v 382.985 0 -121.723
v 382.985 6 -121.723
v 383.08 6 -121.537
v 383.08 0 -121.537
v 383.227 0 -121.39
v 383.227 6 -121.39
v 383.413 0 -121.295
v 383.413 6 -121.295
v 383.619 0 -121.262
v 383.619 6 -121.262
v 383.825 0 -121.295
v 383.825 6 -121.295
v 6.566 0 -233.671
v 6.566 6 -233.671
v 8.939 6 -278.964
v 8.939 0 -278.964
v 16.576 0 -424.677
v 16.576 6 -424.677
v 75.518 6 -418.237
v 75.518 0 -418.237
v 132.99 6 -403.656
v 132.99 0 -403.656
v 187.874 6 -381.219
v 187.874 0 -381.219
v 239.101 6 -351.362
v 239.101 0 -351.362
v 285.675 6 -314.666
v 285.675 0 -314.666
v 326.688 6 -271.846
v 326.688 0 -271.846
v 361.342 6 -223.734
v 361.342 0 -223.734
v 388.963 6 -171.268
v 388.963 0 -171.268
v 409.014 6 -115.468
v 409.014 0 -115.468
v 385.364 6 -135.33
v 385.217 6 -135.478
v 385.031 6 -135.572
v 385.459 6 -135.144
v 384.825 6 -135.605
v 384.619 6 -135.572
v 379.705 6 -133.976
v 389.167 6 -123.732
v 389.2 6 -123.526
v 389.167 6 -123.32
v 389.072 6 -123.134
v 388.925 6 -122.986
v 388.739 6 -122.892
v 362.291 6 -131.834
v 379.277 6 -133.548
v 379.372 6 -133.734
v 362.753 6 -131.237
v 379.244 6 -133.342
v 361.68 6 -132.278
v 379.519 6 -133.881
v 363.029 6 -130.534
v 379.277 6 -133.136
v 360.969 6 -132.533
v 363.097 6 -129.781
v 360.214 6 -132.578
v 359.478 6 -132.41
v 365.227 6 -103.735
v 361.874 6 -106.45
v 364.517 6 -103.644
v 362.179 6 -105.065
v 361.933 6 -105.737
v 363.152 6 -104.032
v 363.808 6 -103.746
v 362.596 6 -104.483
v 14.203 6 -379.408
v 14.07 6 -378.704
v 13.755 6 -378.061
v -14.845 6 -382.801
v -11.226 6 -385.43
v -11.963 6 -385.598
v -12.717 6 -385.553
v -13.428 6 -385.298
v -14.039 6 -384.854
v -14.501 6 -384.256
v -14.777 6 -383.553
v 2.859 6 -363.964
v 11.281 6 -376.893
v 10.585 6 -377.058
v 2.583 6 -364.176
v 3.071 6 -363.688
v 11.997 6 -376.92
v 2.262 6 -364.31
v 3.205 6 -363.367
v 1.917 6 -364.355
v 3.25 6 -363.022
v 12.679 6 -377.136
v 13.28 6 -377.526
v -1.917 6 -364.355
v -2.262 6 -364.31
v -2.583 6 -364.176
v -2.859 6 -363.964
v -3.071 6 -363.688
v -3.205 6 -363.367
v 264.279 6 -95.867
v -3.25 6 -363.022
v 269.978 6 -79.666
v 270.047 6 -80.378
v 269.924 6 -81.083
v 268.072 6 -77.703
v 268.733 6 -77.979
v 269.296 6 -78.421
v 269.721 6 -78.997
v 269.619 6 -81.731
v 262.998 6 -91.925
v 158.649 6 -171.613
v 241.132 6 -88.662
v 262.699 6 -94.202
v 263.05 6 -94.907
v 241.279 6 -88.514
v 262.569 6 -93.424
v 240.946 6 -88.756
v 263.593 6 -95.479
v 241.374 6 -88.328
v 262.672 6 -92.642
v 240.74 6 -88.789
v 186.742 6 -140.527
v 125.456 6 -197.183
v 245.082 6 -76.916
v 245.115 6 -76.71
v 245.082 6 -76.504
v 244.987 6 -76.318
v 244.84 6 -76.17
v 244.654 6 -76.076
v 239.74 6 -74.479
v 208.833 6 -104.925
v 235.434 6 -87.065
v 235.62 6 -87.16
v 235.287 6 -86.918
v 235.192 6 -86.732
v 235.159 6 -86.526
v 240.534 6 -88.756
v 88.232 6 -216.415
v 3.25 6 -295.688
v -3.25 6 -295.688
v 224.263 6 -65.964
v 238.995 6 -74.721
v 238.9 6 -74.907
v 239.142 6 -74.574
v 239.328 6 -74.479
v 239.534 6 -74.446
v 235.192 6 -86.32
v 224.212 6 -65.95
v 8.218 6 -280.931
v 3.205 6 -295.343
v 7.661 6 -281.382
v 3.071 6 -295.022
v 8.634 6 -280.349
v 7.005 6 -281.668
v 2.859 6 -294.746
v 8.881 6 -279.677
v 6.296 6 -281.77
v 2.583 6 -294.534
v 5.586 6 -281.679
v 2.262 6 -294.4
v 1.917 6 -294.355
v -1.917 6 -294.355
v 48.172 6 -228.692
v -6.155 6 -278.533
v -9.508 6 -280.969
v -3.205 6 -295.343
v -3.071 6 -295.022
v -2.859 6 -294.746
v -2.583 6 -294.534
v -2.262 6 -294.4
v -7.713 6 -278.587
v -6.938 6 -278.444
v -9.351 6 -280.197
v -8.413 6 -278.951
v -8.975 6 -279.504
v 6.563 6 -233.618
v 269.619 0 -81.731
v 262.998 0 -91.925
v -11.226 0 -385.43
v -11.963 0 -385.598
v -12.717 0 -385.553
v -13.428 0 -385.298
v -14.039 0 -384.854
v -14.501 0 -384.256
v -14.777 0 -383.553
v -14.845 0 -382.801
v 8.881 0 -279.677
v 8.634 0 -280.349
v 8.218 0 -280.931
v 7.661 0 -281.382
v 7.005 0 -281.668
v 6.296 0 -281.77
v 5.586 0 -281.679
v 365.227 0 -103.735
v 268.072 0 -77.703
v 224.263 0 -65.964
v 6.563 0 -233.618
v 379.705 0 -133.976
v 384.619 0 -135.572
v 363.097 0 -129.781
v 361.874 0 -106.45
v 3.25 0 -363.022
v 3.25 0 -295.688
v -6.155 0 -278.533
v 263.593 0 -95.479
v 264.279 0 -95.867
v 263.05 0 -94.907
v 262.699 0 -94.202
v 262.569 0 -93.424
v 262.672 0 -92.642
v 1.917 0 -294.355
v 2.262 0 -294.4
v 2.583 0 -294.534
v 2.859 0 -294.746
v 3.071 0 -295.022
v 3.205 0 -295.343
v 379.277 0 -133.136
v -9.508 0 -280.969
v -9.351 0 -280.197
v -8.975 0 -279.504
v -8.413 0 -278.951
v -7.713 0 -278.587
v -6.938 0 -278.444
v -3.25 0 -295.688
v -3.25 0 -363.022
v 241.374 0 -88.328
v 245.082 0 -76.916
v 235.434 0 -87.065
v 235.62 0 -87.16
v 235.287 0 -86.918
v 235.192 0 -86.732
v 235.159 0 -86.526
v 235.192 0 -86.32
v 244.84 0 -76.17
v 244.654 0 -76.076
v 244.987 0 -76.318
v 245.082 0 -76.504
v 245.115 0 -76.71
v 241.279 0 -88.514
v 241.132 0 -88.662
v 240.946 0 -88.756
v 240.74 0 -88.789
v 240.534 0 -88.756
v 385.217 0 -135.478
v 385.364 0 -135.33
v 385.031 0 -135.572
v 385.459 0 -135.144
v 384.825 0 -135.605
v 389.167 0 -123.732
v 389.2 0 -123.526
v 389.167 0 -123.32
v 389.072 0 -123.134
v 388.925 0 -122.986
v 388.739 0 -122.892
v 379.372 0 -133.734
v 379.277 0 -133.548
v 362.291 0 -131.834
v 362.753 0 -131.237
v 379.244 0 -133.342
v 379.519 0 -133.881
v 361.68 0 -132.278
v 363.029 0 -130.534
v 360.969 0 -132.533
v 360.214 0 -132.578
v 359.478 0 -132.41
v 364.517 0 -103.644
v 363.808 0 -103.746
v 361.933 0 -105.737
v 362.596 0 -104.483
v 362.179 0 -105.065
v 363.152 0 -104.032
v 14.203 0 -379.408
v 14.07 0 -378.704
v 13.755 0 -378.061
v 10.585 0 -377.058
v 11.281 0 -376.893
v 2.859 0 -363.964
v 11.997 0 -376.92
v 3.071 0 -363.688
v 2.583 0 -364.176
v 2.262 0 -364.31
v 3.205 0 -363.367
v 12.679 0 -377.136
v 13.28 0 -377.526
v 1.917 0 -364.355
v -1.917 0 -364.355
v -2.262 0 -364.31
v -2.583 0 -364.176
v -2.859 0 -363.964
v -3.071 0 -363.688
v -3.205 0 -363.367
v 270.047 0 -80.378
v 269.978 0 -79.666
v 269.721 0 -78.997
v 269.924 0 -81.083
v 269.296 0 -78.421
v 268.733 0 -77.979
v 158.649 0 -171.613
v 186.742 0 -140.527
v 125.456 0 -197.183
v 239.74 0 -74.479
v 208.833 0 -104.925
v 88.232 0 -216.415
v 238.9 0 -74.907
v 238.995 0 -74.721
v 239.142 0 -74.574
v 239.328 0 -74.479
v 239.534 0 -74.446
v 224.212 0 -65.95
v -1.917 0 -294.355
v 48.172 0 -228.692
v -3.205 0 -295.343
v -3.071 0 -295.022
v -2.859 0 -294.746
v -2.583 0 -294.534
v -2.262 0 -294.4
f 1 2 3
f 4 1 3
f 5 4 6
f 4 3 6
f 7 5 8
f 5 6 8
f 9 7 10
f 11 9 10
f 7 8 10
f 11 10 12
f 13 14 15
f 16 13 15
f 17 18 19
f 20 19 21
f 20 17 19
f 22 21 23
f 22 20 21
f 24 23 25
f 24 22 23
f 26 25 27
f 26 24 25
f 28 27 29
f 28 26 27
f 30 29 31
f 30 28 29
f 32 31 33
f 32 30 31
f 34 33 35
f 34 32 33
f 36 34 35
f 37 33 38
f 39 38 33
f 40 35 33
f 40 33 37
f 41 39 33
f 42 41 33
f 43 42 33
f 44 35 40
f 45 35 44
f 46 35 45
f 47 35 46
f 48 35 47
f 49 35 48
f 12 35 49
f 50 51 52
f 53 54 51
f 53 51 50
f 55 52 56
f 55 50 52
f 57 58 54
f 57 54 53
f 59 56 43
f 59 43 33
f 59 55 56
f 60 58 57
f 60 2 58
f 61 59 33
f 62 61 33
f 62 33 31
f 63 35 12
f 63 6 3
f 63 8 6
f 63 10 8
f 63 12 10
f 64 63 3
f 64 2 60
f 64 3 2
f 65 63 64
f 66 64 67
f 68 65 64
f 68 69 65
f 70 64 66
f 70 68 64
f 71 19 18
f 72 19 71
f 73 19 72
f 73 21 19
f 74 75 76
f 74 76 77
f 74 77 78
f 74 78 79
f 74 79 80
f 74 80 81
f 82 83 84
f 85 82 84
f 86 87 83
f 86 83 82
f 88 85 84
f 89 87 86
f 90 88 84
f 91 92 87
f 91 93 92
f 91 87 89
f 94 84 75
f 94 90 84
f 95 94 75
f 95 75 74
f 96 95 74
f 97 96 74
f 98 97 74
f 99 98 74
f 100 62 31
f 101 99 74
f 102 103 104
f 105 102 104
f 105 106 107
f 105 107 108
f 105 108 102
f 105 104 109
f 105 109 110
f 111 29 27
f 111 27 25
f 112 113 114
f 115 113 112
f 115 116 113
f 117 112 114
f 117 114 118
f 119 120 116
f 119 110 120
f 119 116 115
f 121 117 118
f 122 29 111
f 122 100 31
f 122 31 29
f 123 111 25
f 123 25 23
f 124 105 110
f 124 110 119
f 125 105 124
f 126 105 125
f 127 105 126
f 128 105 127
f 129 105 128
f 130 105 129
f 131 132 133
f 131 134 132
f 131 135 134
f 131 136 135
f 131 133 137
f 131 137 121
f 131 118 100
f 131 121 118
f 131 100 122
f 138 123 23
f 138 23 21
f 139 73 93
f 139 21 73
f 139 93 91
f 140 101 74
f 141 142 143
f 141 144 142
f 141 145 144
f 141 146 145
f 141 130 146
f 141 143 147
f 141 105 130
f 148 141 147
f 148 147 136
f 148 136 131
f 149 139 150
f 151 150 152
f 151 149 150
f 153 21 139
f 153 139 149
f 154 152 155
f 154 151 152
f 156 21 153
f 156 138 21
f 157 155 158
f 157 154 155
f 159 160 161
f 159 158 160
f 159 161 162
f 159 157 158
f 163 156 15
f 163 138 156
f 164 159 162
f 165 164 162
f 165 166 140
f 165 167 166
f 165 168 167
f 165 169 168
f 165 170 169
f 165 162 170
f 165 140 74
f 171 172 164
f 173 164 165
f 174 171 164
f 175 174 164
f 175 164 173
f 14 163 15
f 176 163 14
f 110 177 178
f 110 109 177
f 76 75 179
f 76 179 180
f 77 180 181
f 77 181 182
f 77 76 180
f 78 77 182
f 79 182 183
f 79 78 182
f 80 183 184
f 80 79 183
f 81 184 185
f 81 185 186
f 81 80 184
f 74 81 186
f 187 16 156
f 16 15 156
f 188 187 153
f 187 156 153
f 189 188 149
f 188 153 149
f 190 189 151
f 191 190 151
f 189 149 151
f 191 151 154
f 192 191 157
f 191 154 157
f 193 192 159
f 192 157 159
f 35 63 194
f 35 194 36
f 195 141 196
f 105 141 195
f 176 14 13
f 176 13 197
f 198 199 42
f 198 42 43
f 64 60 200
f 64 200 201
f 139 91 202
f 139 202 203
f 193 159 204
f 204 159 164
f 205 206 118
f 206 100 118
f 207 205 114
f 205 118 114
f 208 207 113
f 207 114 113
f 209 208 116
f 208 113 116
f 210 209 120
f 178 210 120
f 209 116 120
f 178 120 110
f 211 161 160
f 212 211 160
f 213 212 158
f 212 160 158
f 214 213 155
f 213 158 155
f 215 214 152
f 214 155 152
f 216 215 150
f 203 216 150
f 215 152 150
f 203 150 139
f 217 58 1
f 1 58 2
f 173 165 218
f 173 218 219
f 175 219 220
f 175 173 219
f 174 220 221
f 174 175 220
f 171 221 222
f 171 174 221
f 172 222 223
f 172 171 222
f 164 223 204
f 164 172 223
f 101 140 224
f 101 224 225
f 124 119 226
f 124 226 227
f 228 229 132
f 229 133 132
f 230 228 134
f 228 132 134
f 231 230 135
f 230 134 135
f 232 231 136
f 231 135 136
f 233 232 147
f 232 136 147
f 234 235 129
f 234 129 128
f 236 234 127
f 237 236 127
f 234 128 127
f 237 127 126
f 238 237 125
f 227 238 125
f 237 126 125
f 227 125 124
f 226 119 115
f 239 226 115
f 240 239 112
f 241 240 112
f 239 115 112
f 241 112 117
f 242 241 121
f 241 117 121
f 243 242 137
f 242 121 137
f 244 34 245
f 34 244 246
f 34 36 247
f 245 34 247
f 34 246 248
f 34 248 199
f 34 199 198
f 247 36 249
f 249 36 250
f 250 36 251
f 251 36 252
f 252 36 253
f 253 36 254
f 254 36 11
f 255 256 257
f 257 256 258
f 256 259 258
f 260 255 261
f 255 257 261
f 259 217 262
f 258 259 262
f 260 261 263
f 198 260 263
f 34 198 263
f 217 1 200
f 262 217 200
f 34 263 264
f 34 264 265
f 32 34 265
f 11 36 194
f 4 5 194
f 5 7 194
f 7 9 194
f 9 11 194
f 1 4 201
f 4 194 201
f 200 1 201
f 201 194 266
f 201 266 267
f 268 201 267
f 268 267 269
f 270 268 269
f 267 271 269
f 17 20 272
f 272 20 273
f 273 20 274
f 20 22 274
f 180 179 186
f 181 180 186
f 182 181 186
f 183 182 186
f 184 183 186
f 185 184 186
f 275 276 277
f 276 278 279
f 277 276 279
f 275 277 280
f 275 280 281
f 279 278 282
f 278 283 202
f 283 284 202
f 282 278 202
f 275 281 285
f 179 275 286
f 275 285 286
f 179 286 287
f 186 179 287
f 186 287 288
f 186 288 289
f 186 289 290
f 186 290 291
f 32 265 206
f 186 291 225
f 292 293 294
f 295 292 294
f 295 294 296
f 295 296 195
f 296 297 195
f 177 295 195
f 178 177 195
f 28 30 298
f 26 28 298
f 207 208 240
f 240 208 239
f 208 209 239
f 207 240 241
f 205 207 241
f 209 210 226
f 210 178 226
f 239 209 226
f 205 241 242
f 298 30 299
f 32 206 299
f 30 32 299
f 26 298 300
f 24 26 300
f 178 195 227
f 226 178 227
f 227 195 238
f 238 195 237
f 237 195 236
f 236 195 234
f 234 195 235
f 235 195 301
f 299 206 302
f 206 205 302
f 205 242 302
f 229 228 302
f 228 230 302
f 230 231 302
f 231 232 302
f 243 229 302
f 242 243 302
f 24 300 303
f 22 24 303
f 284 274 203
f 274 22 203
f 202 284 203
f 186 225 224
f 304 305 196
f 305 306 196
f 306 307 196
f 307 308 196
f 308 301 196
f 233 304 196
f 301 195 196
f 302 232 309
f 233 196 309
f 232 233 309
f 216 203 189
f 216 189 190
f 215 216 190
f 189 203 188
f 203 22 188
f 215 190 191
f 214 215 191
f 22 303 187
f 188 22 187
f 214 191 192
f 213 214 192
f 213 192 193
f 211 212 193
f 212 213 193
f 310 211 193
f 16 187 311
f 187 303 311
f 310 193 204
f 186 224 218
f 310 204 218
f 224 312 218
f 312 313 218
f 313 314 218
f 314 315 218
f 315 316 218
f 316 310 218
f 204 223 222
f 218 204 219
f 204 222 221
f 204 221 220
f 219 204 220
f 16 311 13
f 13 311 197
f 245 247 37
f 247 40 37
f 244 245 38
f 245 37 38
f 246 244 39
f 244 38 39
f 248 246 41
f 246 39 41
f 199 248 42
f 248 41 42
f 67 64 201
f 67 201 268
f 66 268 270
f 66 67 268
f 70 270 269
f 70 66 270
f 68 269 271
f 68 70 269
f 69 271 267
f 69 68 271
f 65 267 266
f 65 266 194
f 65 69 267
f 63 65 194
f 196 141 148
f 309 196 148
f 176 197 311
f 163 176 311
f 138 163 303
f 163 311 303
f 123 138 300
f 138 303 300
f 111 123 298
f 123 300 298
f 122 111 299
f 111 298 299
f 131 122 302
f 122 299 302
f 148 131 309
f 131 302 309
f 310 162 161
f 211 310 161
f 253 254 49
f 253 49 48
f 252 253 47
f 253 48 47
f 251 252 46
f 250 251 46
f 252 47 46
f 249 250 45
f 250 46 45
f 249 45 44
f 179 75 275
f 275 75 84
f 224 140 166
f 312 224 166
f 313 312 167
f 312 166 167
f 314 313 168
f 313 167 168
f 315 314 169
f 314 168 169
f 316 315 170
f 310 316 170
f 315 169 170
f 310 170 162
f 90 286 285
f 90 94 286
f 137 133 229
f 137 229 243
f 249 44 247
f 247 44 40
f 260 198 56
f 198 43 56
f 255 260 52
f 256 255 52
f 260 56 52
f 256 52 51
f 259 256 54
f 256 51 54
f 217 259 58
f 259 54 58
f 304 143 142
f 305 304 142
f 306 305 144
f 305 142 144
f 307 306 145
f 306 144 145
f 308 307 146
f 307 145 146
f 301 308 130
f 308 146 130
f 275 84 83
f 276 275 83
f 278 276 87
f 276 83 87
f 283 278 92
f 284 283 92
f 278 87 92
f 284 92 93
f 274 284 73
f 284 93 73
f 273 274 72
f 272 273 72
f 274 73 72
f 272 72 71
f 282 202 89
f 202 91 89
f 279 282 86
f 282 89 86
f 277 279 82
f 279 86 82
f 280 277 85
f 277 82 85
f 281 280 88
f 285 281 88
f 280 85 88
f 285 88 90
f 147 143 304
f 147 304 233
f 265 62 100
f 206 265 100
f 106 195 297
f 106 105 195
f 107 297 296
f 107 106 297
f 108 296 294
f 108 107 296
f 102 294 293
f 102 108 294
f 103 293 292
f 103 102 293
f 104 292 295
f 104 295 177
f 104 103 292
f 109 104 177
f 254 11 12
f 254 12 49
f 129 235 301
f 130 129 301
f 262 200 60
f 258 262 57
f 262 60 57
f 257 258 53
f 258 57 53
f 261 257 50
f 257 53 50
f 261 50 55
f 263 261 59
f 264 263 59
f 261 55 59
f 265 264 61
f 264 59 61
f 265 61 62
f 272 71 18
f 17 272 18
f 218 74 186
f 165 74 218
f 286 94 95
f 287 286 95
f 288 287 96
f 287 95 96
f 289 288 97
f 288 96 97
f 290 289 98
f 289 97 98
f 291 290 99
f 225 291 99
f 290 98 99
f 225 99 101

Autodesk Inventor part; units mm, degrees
ref_plane "YZ Plane" through (0, 0, 0) normal (1, 0, 0) x (0, 1, 0)
ref_plane "XZ Plane" through (0, 0, 0) normal (0, 1, 0) x (-1, 0, 0)
ref_plane "XY Plane" through (0, 0, 0) normal (0, 0, 1) x (1, 0, 0)
sketch "Sketch1" plane through (0, 0, 0) normal (0, 1, 0) x (-1, 0, 0)
  circle A0 centre (0, 0) radius 425
  circle A1 centre (0, 0) radius 233.71
  dimension "d84" = 467.42
  dimension "d85" = 850
extrude "Extrusion3" add sketch "Sketch1" along normal blind 6
sketch "Sketch2" plane through (0, 6, 0) normal (0, 1, 0) x (1, 0, 0)
  circle A0 centre (0, 0) radius 329.355 construction
  line L0 (3.25, 363.0217) -> (3.25, 295.6883)
  line L1 (-3.25, 295.6883) -> (-3.25, 363.0217)
  arc A1 (-3.25, 295.6883) -> (-1.9167, 294.355) centre (-1.9167, 295.6883) ccw
  arc A2 (1.9167, 294.355) -> (3.25, 295.6883) centre (1.9167, 295.6883) ccw
  arc A3 (-1.9167, 364.355) -> (-3.25, 363.0217) centre (-1.9167, 363.0217) ccw
  arc A4 (3.25, 363.0217) -> (1.9167, 364.355) centre (1.9167, 363.0217) ccw
  line L2 (-1.9167, 364.355) -> (1.9167, 364.355)
  line L3 (-1.9167, 294.355) -> (1.9167, 294.355)
  line L4 (0, 294.355) -> (0, 329.355) construction
  line L5 (0, 364.355) -> (0, 329.355) construction
  line L6 (0, 364.355) -> (0, 294.355) construction
  line L7 (175.0629, -238.5433) -> (171.9617, -240.7965)
  arc A5 (176.9253, -238.8383) -> (175.0629, -238.5433) centre (175.8467, -239.622) ccw
  arc A6 (171.9617, -240.7965) -> (171.6667, -242.6589) centre (172.7454, -241.8752) ccw
  line L8 (173.0175, -238.1382) -> (193.59, -266.4538) construction
  line L9 (211.2443, -297.1327) -> (171.6667, -242.6589)
  line L10 (176.9253, -238.8383) -> (216.5029, -293.3121)
  line L11 (214.1625, -294.7694) -> (173.0175, -238.1382) construction
  line L12 (214.1625, -294.7694) -> (193.59, -266.4538) construction
  arc A7 (211.2443, -297.1327) -> (213.1067, -297.4277) centre (212.323, -296.349) ccw
  line L13 (216.2079, -295.1745) -> (213.1067, -297.4277)
  arc A8 (216.2079, -295.1745) -> (216.5029, -293.3121) centre (215.4242, -294.0958) ccw
  line L14 (280.1548, 92.2019) -> (281.3393, 88.5562)
  arc A9 (281.0108, 93.882) -> (280.1548, 92.2019) centre (281.4229, 92.614) ccw
  arc A10 (281.3393, 88.5562) -> (283.0194, 87.7002) centre (282.6074, 88.9682) ccw
  line L15 (279.9482, 90.9607) -> (313.2352, 101.7763) construction
  line L16 (347.0573, 108.5073) -> (283.0194, 87.7002)
  line L17 (281.0108, 93.882) -> (345.0486, 114.6892)
  line L18 (346.5222, 112.5919) -> (279.9482, 90.9607) construction
  line L19 (346.5222, 112.5919) -> (313.2352, 101.7763) construction
  arc A11 (347.0573, 108.5073) -> (347.9133, 110.1874) centre (346.6452, 109.7754) ccw
  line L20 (346.7287, 113.8331) -> (347.9133, 110.1874)
  arc A12 (346.7287, 113.8331) -> (345.0486, 114.6892) centre (345.4607, 113.4211) ccw
  dimension "d86" = 658.71
  dimension "d21" = 6.5
  dimension "d24" = 2.6667
  dimension "d25" = 2.6667
  dimension "d32" = 1.3333
  dimension "d33" = 1.3333
  dimension "d162" = 70
  dimension "d163" = 294.355
  dimension "d165" = 3.25
extrude "Extrusion4" cut sketch "Sketch2" against normal through all
sketch "Sketch3" plane through (0, 6, 0) normal (0, 1, 0) x (1, 0, 0)
  arc A0 (-131.3389, -404.1968) -> (131.3445, -404.195) centre (0, 0) ccw
  arc A1 (-77.7244, -128.3741) -> (77.7297, -128.3709) centre (0, 0) ccw
  line L0 (-122.1811, -173.696) -> (-161.3589, -227.6196)
  line L1 (-131.3389, -404.1968) -> (-77.7244, -128.3741)
  line L2 (0, 0) -> (0, -341.2918)
  line L3 (131.3445, -404.195) -> (77.7297, -128.3709)
  line L4 (210.5535, -295.3313) -> (171.3679, -241.3969) projected
  dimension "d52" = 25
  dimension "d87" = 150.07
  dimension "d88" = 425
  dimension "d89" = 25
  dimension "d90" = 11
  dimension "d91" = 11
sketch "Sketch5" plane through (0, 6, 0) normal (0, 1, 0) x (1, 0, 0)
  line L0 (3.25, 363.0217) -> (3.25, 295.6883) projected
  line L1 (5.5862, 281.6788) -> (-6.155, 278.5328)
  line L2 (-11.2263, 385.43) -> (10.5847, 377.0575)
  line L3 (6.5657, 233.6709) -> (8.9394, 278.9635)
  line L4 (14.2034, 379.4075) -> (16.5771, 424.7001)
  arc A0 (10.5847, 377.0575) -> (14.2034, 379.4075) centre (11.5404, 379.5471) ccw
  arc A1 (8.9394, 278.9635) -> (5.5862, 281.6788) centre (6.2763, 279.103) ccw
  arc A2 (-11.2263, 385.43) -> (-14.8449, 382.8009) centre (-12.1819, 382.9405) ccw
  line L5 (-3.25, 295.6883) -> (-3.25, 363.0217) projected
  line L6 (-14.8449, 382.8009) -> (-9.5081, 280.969)
  arc A3 (-9.5081, 280.969) -> (-6.155, 278.5328) centre (-6.8451, 281.1086) ccw
  line L7 (-1.9167, 294.355) -> (1.9167, 294.355) projected
  line L8 (1.9167, 364.355) -> (-1.9167, 364.355) projected
  line L9 (16.5771, 424.7001) -> (16.5774, 424.7058)
  line L10 (6.5657, 233.6709) -> (6.5621, 233.6028)
  circle A4 centre (0, 0) radius 425
  circle A5 centre (0, 0) radius 233.71
  line L11 (-356.4489, 130.7516) -> (-398.7912, 147.0053)
  arc A6 (-355.3322, 126.5839) -> (-356.4489, 130.7516) centre (-357.4046, 128.2621) ccw
  line L12 (-370.0348, 108.4276) -> (-355.3322, 126.5839)
  arc A7 (-370.0348, 108.4276) -> (-368.6526, 104.1736) centre (-367.9624, 106.7494) ccw
  line L13 (-368.6526, 104.1736) -> (-270.1556, 77.7814)
  arc A8 (-270.1556, 77.7814) -> (-266.8024, 80.2177) centre (-269.4654, 80.3572) ccw
  line L14 (-266.1663, 92.3563) -> (-266.8024, 80.2177)
  arc A9 (-262.5476, 94.7063) -> (-266.1663, 92.3563) centre (-263.5032, 92.2167) ccw
  line L15 (-220.2053, 78.4526) -> (-262.5476, 94.7063)
  line L16 (-220.2053, 78.4526) -> (-220.1417, 78.4282)
  line L17 (-398.7912, 147.0053) -> (-398.7965, 147.0073)
  line L18 (-142.66, -185.1845) -> (-142.6172, -185.1316)
  line L19 (-263.0436, -333.8458) -> (-263.0472, -333.8502)
  line L20 (132.0366, -192.9029) -> (131.9995, -192.8458)
  line L21 (236.2213, -353.3334) -> (236.2244, -353.3381)
  line L22 (365.2271, 103.7351) -> (409.0364, 115.4738)
  arc A10 (361.8739, 106.4505) -> (365.2271, 103.7351) centre (364.5369, 106.3109) ccw
  line L23 (363.0966, 129.7812) -> (361.8739, 106.4505)
  arc A11 (363.0966, 129.7812) -> (359.478, 132.4103) centre (360.4336, 129.9208) ccw
  line L24 (359.478, 132.4103) -> (264.2793, 95.867)
  arc A12 (264.2793, 95.867) -> (262.9985, 91.9251) centre (265.2349, 93.3774) ccw
  line L25 (269.6187, 81.7308) -> (262.9985, 91.9251)
  arc A13 (268.0724, 77.7026) -> (269.6187, 81.7308) centre (267.3822, 80.2784) ccw
  line L26 (224.2631, 65.9639) -> (268.0724, 77.7026)
  line L27 (224.2631, 65.9639) -> (224.1973, 65.9463)
  line L28 (409.0364, 115.4738) -> (409.0419, 115.4753)
  line L29 (0, -233.71) -> (0, -425)
  arc A14 (131.3445, -404.195) -> (-131.3389, -404.1968) centre (0, 0) ccw projected
  point P0 (-425, 0)
  point P1 (-425, 0)
  point P2 (-398.7693, 146.9969)
  point P3 (-220.1557, 78.4336)
  point P4 (16.5759, 424.6766)
  point P5 (6.5629, 233.6178)
  point P6 (409.0137, 115.4677)
  point P7 (224.2118, 65.9502)
  dimension "d63" = 2.6667
  dimension "d64" = 3
  dimension "d66" = 3
  dimension "d67" = 2.6667
  dimension "d68" = 2.6667
  dimension "d70" = 72
  dimension "d71" = 72
sketch "Sketch6" plane through (0, 6, 0) normal (0, 1, 0) x (1, 0, 0)
  line L0 (237.9351, -331.8846) -> (247.6433, -324.8312)
  line L1 (243.8227, -319.5725) -> (234.1145, -326.626)
  line L2 (210.5535, -295.3313) -> (171.3679, -241.3969) projected
  line L3 (215.5172, -293.3731) -> (212.416, -295.6263) projected
  arc A0 (244.7539, -319.72) -> (243.8227, -319.5725) centre (244.2145, -320.1119) ccw
  arc A1 (247.6433, -324.8312) -> (247.7908, -323.9) centre (247.2514, -324.2918) ccw
  arc A2 (237.0039, -331.7371) -> (237.9351, -331.8846) centre (237.5432, -331.3452) ccw
  arc A3 (234.1145, -326.626) -> (233.967, -327.5572) centre (234.5063, -327.1653) ccw
  line L4 (233.967, -327.5572) -> (237.0039, -331.7371)
  line L5 (247.7908, -323.9) -> (244.7539, -319.72)
  line L6 (171.3679, -241.3969) -> (210.5535, -295.3313) projected
  line L7 (190.9607, -268.3641) -> (196.2193, -264.5435)
  line L8 (215.8122, -291.5107) -> (176.6265, -237.5763) projected
  line L9 (145.065, -204.0599) -> (154.7732, -197.0065)
  line L10 (158.5938, -202.2651) -> (148.8856, -209.3185)
  arc A4 (158.5938, -202.2651) -> (158.7413, -201.3339) centre (158.202, -201.7257) ccw
  arc A5 (155.7044, -197.154) -> (154.7732, -197.0065) centre (155.1651, -197.5458) ccw
  arc A6 (145.065, -204.0599) -> (144.9175, -204.9911) centre (145.4569, -204.5992) ccw
  arc A7 (147.9544, -209.171) -> (148.8856, -209.3185) centre (148.4938, -208.7792) ccw
  line L11 (147.9544, -209.171) -> (144.9175, -204.9911)
  line L12 (155.7044, -197.154) -> (158.7413, -201.3339)
  point P0 (0, 0)
  dimension "d104" = 6.5
  dimension "d105" = 12
  dimension "d108" = 1.3333
  dimension "d109" = 1.3333
  dimension "d110" = 1.3333
  dimension "d111" = 1.3333
  dimension "d112" = 0
  dimension "d149" = 145
  dimension "d150" = 90
  dimension "d151" = 90
  dimension "d152" = 90
  dimension "d153" = 90
extrude "Extrusion7" cut sketch "Sketch6" against normal through all
pattern_circular "Circular Pattern2" count 2 over 72 about axis through (0, -10, 0) along (0, 1, 0) of "Extrusion7"
pattern_circular "Circular Pattern3" count 2 over 144 about axis through (0, -10, 0) along (0, 1, 0) of "Extrusion7"
mirror "Mirror3" about plane through (0, 0, 0) normal (1, 0, 0) of "Extrusion7"
extrude "Extrusion10" cut sketch "Sketch3" against normal blind 10
mirror "Mirror4" about plane through (0, 0, 0) normal (1, 0, 0) of "Extrusion4"
pattern_circular "Circular Pattern4" count 2 over 144 about axis through (0, -10, 0) along (0, -1, 0) of "Extrusion7"
extrude "Extrusion11" cut sketch "Sketch5" against normal through all contours A1 L3 L10 A5 L16 L15 A9 L14 A8 L13 A7 L12 A6 L11 A4 L4 A0 L2 A2 L6 A3 L1 | L27 L26 A13 L25 A12 L24 A11 L23 A10 L22 A4 L29 A5 | A5 L29 A4 L11 A6 L12 A7 L13 A8 L14 A9 L15 L16
equation "\"BendRadius\" = Thickness"
equation "\"BendReliefWidth\" = Thickness"
equation "\"BendReliefDepth\" = 0.5 * Thickness"
equation "\"CornerReliefSize\" = 4 * Thickness"
equation "\"MinimumRemnant\" = 2 * Thickness"
equation "\"TransitionRadius\" = BendRadius"
equation "\"JacobiRadiusSize\" = BendRadius"
equation "\"GapSize\" = Thickness"
equation "\"Thickness\" = 0.5"
properties part number "Ring C3" material "Wood (Maple)"
